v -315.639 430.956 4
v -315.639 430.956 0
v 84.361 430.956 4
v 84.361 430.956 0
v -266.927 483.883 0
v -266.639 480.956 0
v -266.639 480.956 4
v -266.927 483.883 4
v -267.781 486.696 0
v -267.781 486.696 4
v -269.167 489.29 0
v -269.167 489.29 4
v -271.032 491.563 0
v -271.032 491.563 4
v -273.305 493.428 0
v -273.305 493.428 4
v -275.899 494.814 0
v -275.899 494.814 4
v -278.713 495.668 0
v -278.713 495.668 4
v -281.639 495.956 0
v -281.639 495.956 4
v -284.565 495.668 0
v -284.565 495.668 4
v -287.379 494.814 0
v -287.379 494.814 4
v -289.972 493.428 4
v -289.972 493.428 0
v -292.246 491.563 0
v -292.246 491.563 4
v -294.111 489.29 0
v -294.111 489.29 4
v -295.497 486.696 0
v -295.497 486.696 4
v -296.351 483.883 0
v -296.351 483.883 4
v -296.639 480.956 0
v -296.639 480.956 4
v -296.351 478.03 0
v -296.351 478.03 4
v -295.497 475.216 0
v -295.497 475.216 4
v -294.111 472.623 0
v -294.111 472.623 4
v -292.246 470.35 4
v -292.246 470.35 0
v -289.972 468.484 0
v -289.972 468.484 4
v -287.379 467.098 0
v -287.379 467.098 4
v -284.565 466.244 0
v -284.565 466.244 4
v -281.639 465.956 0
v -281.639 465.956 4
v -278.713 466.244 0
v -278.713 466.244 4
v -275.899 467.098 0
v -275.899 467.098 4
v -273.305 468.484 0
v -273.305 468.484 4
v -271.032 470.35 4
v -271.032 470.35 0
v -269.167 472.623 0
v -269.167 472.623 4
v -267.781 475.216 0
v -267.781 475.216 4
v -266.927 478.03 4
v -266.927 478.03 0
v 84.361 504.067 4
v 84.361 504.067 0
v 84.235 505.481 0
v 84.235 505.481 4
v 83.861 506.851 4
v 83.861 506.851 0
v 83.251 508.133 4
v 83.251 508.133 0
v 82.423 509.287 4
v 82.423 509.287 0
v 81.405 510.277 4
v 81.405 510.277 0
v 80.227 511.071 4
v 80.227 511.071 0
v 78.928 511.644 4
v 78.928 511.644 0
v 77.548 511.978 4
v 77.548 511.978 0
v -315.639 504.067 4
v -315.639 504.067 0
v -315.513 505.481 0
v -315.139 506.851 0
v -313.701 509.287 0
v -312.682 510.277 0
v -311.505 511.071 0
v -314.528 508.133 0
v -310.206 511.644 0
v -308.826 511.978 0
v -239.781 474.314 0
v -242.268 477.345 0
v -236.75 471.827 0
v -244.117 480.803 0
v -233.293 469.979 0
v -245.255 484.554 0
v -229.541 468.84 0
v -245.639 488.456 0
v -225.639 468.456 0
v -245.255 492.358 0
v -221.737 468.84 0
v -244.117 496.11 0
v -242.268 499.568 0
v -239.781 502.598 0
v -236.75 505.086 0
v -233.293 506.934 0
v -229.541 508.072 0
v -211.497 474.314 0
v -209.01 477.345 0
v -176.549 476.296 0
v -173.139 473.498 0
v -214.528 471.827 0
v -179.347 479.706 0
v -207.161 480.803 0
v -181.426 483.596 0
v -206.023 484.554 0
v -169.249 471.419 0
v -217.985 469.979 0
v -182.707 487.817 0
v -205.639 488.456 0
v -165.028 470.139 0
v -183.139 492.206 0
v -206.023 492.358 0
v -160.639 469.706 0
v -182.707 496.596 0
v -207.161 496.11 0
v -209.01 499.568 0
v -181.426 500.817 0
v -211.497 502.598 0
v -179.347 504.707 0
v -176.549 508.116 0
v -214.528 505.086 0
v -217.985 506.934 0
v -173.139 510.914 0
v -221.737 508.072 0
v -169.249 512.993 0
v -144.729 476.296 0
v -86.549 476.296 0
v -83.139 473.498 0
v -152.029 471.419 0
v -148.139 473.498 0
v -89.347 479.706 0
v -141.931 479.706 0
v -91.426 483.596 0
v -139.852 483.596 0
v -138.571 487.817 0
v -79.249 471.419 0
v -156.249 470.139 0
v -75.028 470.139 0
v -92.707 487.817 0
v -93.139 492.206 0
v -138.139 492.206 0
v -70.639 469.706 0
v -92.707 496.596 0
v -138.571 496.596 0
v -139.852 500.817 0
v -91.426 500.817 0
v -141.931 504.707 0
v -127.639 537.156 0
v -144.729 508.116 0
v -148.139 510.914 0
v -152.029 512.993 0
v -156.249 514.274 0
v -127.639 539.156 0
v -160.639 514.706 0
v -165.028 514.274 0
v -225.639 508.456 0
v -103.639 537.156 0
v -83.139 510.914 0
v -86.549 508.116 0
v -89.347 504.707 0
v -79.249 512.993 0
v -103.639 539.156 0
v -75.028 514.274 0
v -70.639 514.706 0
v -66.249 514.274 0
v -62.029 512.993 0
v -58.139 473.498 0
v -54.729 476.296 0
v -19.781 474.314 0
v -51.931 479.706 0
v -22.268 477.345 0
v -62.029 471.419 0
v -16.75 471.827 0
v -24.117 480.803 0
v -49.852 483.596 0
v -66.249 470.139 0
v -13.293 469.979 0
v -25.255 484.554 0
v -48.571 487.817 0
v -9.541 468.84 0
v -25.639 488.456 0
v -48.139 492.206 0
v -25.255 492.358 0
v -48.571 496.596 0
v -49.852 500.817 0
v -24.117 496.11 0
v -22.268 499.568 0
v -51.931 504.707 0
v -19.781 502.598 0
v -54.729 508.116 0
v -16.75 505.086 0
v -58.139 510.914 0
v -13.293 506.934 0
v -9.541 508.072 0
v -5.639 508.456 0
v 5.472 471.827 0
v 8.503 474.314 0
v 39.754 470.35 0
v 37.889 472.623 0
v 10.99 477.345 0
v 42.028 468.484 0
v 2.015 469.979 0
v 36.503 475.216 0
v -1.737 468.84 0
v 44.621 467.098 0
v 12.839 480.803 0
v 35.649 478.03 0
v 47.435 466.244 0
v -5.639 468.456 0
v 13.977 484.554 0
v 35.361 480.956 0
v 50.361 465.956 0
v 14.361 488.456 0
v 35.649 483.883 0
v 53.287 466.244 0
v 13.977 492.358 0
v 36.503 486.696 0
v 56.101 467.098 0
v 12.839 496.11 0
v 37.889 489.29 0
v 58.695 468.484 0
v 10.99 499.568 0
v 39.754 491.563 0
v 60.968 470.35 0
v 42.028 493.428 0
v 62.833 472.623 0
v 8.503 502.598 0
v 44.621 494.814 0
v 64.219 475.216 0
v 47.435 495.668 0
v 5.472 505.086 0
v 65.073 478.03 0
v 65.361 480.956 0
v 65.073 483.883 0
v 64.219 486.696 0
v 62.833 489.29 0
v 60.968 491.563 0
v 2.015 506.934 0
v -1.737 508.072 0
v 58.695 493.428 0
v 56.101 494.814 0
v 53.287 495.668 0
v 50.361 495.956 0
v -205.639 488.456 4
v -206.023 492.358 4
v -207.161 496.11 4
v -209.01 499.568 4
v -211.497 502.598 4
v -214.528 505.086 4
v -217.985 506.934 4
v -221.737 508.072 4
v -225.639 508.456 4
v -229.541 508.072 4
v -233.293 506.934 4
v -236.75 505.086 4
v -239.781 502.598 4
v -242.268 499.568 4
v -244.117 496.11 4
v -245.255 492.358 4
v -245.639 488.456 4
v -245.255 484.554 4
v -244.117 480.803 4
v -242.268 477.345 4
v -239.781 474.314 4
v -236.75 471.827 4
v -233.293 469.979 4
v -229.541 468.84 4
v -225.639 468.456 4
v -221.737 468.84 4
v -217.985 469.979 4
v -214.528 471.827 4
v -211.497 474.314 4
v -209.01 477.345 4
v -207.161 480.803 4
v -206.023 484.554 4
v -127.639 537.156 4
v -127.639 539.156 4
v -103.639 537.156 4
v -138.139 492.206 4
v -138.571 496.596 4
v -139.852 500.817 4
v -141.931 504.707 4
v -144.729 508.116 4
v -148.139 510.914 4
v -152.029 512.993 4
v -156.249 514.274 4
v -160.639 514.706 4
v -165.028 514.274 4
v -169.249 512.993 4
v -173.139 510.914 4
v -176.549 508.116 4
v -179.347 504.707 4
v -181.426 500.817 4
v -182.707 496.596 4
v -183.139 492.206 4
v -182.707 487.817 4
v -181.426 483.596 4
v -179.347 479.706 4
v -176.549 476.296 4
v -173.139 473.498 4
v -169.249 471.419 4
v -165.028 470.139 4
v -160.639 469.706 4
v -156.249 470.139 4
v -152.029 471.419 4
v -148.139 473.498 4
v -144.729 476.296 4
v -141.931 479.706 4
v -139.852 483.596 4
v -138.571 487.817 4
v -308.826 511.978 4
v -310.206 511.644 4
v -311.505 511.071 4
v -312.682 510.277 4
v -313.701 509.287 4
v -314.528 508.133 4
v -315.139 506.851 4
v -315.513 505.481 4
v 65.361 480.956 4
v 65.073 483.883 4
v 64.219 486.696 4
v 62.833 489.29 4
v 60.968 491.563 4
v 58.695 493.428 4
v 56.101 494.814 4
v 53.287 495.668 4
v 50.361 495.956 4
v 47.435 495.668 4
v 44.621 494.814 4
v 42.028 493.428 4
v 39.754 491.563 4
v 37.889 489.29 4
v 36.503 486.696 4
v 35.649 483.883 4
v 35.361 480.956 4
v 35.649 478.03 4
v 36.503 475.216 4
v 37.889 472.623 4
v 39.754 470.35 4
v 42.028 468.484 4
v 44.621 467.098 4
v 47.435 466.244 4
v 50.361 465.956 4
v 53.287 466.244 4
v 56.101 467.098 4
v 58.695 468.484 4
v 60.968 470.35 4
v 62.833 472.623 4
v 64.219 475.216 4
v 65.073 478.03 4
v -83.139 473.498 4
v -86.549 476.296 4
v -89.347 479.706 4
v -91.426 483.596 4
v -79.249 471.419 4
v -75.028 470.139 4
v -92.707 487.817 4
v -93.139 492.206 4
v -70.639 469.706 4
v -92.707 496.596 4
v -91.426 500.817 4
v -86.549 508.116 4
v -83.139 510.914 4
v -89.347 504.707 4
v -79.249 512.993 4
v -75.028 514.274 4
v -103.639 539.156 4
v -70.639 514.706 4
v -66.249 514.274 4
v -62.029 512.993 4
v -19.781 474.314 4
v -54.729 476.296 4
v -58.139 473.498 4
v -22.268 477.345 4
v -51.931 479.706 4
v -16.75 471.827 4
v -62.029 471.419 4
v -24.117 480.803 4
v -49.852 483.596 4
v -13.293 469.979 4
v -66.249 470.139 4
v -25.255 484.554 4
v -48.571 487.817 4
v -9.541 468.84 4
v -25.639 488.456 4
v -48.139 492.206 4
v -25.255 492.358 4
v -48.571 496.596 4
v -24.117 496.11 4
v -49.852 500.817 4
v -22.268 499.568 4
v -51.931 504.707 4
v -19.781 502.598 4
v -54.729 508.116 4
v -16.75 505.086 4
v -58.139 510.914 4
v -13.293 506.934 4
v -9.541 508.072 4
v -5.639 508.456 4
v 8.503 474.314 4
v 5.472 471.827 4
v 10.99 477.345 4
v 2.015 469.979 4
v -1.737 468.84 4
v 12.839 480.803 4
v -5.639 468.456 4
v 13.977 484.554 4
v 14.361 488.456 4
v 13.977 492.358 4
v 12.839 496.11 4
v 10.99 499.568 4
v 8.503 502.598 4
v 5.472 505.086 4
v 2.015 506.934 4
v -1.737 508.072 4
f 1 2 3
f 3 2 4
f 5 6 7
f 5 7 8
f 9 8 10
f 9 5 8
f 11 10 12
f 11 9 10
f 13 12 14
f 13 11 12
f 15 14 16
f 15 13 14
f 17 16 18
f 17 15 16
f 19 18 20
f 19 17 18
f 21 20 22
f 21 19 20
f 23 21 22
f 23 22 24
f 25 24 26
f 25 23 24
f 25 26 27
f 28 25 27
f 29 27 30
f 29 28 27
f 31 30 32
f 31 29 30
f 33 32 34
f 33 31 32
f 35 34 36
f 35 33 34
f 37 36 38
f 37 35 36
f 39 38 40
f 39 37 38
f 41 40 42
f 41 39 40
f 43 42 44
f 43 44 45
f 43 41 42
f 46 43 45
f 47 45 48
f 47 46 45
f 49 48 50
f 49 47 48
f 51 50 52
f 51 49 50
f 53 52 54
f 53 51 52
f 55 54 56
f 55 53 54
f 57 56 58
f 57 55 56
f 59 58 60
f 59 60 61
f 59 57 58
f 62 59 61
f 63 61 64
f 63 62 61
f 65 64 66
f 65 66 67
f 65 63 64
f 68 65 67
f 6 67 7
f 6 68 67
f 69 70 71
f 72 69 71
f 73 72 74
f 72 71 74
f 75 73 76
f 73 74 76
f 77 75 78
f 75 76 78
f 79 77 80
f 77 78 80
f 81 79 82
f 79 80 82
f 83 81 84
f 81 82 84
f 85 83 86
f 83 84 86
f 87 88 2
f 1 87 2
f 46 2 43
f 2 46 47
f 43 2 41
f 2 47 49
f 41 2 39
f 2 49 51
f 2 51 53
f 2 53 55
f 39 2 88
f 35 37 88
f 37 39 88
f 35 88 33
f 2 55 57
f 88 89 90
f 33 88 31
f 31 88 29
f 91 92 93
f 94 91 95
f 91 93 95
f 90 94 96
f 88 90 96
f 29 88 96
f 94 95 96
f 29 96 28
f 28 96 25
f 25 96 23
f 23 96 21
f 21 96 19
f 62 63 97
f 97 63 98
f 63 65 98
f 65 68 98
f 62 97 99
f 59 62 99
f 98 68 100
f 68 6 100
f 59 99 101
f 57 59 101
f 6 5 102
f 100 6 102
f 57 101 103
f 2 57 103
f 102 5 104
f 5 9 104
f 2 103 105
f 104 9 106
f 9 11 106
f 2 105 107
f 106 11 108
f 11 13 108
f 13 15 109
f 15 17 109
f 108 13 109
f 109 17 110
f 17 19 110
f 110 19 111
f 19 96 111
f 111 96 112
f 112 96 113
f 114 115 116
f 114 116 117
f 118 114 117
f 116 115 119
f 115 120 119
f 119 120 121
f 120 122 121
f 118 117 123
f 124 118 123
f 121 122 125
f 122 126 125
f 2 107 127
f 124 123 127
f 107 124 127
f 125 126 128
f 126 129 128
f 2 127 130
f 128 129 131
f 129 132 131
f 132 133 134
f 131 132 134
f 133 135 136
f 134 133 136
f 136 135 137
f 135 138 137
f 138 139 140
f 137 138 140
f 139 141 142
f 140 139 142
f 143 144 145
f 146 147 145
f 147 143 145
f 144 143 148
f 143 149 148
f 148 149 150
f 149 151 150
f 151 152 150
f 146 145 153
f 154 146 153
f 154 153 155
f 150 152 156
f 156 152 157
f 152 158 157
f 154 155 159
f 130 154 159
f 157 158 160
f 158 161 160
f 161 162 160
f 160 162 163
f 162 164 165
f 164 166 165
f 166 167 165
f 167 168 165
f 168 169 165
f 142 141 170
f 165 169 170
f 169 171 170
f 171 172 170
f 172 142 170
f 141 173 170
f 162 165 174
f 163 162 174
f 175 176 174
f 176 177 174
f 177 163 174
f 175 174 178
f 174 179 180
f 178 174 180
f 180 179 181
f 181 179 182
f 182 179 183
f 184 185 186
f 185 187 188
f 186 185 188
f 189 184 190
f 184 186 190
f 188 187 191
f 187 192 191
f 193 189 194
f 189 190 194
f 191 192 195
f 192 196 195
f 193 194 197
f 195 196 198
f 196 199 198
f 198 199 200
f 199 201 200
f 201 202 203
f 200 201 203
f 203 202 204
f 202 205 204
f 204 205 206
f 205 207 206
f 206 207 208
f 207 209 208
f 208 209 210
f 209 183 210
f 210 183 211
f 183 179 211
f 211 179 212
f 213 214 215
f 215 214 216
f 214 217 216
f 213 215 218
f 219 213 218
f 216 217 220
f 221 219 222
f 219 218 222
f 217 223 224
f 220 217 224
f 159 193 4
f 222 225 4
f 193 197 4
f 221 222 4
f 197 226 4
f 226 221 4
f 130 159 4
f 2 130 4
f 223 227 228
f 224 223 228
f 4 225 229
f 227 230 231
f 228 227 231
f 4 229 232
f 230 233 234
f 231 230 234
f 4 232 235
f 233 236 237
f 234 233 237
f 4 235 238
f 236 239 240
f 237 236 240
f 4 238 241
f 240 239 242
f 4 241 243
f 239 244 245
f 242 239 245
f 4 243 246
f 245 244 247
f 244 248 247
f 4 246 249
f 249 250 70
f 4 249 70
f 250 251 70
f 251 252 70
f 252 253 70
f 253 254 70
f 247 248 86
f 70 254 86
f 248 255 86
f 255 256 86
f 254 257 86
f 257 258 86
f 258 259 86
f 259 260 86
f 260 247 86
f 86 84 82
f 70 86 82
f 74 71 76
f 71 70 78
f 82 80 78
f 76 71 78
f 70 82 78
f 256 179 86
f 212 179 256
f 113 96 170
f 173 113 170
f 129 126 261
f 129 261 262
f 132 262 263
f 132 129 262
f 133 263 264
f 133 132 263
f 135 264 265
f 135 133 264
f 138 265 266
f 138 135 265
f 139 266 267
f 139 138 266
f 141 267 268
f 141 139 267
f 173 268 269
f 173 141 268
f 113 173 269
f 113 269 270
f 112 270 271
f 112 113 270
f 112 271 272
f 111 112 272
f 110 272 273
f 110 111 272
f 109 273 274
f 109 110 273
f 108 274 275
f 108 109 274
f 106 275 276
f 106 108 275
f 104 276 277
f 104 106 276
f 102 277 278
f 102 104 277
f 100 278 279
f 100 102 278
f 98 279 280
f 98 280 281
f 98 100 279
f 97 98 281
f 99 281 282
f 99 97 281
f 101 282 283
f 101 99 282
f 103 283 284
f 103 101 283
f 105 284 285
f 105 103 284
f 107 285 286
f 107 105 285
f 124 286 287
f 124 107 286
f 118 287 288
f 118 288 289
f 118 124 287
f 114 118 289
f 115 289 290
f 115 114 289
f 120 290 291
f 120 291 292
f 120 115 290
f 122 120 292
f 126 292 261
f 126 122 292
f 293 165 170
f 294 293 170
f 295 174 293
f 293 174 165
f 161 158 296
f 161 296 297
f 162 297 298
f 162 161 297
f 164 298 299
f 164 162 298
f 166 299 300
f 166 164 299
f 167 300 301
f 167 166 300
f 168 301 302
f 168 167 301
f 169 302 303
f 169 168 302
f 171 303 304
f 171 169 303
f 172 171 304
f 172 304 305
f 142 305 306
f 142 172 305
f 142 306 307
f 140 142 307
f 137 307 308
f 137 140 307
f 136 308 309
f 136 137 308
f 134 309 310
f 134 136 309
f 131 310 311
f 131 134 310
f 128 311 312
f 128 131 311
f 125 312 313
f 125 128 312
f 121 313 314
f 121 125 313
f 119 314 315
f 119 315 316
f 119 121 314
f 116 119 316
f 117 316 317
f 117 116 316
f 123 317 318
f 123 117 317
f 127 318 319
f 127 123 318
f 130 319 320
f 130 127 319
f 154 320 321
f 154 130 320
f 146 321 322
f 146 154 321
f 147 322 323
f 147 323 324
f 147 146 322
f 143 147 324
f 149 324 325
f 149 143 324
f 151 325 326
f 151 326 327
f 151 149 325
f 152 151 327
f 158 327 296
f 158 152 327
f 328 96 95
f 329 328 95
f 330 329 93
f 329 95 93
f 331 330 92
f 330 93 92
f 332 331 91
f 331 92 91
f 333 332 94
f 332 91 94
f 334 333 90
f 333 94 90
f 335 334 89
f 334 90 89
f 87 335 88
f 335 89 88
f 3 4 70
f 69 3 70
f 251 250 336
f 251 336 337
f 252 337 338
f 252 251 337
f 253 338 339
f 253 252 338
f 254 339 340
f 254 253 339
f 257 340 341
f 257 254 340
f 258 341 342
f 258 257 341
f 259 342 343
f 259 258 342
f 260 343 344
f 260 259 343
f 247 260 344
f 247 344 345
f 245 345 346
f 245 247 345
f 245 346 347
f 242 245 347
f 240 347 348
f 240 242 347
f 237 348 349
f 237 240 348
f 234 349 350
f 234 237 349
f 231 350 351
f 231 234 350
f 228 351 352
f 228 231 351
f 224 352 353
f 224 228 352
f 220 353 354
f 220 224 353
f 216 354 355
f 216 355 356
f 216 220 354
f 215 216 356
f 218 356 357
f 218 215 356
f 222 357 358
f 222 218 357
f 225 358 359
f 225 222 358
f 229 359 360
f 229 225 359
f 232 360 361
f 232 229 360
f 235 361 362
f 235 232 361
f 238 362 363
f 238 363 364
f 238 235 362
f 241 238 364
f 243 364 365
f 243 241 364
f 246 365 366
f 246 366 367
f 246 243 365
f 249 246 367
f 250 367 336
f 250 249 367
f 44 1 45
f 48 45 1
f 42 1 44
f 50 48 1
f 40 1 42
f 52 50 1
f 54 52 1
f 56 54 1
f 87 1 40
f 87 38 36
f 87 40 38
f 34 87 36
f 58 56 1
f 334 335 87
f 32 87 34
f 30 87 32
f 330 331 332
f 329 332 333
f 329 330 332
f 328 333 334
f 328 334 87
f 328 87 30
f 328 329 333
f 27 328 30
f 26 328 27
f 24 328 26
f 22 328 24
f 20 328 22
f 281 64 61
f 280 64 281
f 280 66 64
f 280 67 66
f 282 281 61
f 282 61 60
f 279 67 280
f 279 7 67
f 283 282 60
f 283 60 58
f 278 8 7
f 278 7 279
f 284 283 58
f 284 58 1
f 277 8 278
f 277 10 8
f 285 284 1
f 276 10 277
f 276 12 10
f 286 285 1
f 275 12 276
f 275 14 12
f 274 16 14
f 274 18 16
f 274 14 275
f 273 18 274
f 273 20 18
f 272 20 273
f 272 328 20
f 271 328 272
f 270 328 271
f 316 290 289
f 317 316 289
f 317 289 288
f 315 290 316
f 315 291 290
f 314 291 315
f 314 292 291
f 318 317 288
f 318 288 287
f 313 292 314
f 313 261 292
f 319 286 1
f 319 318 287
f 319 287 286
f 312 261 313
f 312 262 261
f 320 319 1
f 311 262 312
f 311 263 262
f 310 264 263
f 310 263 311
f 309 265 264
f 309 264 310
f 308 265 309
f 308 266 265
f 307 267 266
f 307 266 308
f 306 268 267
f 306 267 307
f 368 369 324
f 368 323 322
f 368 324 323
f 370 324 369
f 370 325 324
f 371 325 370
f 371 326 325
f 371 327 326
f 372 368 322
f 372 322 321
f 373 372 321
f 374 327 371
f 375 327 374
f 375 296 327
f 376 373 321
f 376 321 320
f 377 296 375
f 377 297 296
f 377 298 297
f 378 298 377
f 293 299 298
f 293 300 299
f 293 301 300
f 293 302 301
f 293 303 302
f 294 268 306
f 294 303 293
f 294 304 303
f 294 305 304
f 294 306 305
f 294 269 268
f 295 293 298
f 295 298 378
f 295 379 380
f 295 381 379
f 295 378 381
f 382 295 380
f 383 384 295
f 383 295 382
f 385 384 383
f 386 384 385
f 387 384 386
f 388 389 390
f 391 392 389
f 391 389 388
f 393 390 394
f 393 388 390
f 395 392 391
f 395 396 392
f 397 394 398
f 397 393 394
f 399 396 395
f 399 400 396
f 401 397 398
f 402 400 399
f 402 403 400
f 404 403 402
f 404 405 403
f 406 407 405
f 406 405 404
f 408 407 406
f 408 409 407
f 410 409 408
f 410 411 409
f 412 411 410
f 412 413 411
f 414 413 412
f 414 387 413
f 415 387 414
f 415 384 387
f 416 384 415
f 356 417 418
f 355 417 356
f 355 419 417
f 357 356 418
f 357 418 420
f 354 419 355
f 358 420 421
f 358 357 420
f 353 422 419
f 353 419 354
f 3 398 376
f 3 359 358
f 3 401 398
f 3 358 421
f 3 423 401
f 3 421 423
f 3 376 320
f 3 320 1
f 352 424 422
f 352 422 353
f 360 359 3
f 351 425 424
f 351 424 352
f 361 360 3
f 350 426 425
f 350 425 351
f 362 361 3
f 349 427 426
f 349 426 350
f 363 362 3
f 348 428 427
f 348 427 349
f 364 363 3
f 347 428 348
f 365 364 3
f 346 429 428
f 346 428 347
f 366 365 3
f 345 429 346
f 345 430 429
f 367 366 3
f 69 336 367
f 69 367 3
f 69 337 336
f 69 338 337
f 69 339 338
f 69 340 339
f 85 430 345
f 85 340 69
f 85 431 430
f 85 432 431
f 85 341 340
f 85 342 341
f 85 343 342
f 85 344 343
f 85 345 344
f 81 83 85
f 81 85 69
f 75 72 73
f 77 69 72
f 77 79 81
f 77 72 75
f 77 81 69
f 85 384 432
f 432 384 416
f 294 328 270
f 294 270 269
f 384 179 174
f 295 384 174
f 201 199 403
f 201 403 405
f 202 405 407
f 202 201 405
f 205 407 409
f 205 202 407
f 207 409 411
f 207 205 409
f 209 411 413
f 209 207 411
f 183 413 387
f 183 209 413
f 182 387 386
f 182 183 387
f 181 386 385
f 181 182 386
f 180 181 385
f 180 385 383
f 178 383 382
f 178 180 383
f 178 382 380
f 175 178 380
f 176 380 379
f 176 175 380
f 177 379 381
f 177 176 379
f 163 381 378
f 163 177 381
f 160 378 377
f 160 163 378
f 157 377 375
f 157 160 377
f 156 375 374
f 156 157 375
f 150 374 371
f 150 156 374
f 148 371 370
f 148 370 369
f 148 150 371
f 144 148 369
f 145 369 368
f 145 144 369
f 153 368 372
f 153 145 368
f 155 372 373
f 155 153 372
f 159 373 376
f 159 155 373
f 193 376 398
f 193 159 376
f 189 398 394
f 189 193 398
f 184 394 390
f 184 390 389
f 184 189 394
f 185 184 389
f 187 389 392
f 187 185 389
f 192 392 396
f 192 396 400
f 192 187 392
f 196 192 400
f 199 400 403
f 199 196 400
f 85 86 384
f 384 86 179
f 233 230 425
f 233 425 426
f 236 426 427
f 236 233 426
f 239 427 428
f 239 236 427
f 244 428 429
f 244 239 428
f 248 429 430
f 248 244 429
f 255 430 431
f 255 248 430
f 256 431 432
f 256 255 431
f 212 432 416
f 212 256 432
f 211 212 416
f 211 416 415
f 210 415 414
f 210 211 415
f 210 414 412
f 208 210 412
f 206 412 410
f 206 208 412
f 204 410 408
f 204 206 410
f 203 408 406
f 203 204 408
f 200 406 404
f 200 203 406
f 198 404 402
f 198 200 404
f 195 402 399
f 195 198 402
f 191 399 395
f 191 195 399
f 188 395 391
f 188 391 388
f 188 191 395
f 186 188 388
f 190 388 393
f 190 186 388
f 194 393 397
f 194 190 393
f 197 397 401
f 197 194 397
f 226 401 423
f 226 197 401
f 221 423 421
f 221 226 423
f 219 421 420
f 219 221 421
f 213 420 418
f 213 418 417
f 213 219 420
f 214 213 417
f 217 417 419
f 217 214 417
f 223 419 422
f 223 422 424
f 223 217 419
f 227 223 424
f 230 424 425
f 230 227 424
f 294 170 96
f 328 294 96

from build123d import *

# Parameters (mm, degrees)
SKETCH_1_R      = 15
SKETCH_1_R_2    = 20
SKETCH_1_R_3    = 22.5
EXTRUDE_1_DEPTH = 4


with BuildPart() as part:
    # 草图1 → 凸台-拉伸1 (new body)
    with BuildSketch(Plane.XY):
        with BuildLine():
            Line((-315.638914213, 504.066678813), (-315.638914213, 430.95617818))
            Line((-315.638914213, 430.95617818), (84.361085787, 430.95617818))
            Line((84.361085787, 430.95617818), (84.361085787, 504.066678813))
            ThreePointArc((84.361085787, 504.066678813), (82.42300747, 509.287129513), (77.547809411, 511.978169636))
            Line((77.547809411, 511.978169636), (-103.638914213, 539.15617818))
            Line((-103.638914213, 539.15617818), (-103.638914213, 537.15617818))
            Line((-103.638914213, 537.15617818), (-127.638914213, 537.15617818))
            Line((-127.638914213, 537.15617818), (-127.638914213, 539.15617818))
            Line((-127.638914213, 539.15617818), (-308.825637836, 511.978169636))
            ThreePointArc((-308.825637836, 511.978169636), (-313.700835896, 509.287129513), (-315.638914213, 504.066678813))
        make_face()
        with Locations((50.361085787, 480.95617818)):
            Circle(SKETCH_1_R, mode=Mode.SUBTRACT)
        with Locations((-5.638914213, 488.45617818)):
            Circle(SKETCH_1_R_2, mode=Mode.SUBTRACT)
        with Locations((-70.638914213, 492.20617818)):
            Circle(SKETCH_1_R_3, mode=Mode.SUBTRACT)
        with Locations((-281.638914213, 480.95617818)):
            Circle(SKETCH_1_R, mode=Mode.SUBTRACT)
        with Locations((-225.638914213, 488.45617818)):
            Circle(SKETCH_1_R_2, mode=Mode.SUBTRACT)
        with Locations((-160.638914213, 492.20617818)):
            Circle(SKETCH_1_R_3, mode=Mode.SUBTRACT)
    extrude(amount=EXTRUDE_1_DEPTH)


solid = part.part
